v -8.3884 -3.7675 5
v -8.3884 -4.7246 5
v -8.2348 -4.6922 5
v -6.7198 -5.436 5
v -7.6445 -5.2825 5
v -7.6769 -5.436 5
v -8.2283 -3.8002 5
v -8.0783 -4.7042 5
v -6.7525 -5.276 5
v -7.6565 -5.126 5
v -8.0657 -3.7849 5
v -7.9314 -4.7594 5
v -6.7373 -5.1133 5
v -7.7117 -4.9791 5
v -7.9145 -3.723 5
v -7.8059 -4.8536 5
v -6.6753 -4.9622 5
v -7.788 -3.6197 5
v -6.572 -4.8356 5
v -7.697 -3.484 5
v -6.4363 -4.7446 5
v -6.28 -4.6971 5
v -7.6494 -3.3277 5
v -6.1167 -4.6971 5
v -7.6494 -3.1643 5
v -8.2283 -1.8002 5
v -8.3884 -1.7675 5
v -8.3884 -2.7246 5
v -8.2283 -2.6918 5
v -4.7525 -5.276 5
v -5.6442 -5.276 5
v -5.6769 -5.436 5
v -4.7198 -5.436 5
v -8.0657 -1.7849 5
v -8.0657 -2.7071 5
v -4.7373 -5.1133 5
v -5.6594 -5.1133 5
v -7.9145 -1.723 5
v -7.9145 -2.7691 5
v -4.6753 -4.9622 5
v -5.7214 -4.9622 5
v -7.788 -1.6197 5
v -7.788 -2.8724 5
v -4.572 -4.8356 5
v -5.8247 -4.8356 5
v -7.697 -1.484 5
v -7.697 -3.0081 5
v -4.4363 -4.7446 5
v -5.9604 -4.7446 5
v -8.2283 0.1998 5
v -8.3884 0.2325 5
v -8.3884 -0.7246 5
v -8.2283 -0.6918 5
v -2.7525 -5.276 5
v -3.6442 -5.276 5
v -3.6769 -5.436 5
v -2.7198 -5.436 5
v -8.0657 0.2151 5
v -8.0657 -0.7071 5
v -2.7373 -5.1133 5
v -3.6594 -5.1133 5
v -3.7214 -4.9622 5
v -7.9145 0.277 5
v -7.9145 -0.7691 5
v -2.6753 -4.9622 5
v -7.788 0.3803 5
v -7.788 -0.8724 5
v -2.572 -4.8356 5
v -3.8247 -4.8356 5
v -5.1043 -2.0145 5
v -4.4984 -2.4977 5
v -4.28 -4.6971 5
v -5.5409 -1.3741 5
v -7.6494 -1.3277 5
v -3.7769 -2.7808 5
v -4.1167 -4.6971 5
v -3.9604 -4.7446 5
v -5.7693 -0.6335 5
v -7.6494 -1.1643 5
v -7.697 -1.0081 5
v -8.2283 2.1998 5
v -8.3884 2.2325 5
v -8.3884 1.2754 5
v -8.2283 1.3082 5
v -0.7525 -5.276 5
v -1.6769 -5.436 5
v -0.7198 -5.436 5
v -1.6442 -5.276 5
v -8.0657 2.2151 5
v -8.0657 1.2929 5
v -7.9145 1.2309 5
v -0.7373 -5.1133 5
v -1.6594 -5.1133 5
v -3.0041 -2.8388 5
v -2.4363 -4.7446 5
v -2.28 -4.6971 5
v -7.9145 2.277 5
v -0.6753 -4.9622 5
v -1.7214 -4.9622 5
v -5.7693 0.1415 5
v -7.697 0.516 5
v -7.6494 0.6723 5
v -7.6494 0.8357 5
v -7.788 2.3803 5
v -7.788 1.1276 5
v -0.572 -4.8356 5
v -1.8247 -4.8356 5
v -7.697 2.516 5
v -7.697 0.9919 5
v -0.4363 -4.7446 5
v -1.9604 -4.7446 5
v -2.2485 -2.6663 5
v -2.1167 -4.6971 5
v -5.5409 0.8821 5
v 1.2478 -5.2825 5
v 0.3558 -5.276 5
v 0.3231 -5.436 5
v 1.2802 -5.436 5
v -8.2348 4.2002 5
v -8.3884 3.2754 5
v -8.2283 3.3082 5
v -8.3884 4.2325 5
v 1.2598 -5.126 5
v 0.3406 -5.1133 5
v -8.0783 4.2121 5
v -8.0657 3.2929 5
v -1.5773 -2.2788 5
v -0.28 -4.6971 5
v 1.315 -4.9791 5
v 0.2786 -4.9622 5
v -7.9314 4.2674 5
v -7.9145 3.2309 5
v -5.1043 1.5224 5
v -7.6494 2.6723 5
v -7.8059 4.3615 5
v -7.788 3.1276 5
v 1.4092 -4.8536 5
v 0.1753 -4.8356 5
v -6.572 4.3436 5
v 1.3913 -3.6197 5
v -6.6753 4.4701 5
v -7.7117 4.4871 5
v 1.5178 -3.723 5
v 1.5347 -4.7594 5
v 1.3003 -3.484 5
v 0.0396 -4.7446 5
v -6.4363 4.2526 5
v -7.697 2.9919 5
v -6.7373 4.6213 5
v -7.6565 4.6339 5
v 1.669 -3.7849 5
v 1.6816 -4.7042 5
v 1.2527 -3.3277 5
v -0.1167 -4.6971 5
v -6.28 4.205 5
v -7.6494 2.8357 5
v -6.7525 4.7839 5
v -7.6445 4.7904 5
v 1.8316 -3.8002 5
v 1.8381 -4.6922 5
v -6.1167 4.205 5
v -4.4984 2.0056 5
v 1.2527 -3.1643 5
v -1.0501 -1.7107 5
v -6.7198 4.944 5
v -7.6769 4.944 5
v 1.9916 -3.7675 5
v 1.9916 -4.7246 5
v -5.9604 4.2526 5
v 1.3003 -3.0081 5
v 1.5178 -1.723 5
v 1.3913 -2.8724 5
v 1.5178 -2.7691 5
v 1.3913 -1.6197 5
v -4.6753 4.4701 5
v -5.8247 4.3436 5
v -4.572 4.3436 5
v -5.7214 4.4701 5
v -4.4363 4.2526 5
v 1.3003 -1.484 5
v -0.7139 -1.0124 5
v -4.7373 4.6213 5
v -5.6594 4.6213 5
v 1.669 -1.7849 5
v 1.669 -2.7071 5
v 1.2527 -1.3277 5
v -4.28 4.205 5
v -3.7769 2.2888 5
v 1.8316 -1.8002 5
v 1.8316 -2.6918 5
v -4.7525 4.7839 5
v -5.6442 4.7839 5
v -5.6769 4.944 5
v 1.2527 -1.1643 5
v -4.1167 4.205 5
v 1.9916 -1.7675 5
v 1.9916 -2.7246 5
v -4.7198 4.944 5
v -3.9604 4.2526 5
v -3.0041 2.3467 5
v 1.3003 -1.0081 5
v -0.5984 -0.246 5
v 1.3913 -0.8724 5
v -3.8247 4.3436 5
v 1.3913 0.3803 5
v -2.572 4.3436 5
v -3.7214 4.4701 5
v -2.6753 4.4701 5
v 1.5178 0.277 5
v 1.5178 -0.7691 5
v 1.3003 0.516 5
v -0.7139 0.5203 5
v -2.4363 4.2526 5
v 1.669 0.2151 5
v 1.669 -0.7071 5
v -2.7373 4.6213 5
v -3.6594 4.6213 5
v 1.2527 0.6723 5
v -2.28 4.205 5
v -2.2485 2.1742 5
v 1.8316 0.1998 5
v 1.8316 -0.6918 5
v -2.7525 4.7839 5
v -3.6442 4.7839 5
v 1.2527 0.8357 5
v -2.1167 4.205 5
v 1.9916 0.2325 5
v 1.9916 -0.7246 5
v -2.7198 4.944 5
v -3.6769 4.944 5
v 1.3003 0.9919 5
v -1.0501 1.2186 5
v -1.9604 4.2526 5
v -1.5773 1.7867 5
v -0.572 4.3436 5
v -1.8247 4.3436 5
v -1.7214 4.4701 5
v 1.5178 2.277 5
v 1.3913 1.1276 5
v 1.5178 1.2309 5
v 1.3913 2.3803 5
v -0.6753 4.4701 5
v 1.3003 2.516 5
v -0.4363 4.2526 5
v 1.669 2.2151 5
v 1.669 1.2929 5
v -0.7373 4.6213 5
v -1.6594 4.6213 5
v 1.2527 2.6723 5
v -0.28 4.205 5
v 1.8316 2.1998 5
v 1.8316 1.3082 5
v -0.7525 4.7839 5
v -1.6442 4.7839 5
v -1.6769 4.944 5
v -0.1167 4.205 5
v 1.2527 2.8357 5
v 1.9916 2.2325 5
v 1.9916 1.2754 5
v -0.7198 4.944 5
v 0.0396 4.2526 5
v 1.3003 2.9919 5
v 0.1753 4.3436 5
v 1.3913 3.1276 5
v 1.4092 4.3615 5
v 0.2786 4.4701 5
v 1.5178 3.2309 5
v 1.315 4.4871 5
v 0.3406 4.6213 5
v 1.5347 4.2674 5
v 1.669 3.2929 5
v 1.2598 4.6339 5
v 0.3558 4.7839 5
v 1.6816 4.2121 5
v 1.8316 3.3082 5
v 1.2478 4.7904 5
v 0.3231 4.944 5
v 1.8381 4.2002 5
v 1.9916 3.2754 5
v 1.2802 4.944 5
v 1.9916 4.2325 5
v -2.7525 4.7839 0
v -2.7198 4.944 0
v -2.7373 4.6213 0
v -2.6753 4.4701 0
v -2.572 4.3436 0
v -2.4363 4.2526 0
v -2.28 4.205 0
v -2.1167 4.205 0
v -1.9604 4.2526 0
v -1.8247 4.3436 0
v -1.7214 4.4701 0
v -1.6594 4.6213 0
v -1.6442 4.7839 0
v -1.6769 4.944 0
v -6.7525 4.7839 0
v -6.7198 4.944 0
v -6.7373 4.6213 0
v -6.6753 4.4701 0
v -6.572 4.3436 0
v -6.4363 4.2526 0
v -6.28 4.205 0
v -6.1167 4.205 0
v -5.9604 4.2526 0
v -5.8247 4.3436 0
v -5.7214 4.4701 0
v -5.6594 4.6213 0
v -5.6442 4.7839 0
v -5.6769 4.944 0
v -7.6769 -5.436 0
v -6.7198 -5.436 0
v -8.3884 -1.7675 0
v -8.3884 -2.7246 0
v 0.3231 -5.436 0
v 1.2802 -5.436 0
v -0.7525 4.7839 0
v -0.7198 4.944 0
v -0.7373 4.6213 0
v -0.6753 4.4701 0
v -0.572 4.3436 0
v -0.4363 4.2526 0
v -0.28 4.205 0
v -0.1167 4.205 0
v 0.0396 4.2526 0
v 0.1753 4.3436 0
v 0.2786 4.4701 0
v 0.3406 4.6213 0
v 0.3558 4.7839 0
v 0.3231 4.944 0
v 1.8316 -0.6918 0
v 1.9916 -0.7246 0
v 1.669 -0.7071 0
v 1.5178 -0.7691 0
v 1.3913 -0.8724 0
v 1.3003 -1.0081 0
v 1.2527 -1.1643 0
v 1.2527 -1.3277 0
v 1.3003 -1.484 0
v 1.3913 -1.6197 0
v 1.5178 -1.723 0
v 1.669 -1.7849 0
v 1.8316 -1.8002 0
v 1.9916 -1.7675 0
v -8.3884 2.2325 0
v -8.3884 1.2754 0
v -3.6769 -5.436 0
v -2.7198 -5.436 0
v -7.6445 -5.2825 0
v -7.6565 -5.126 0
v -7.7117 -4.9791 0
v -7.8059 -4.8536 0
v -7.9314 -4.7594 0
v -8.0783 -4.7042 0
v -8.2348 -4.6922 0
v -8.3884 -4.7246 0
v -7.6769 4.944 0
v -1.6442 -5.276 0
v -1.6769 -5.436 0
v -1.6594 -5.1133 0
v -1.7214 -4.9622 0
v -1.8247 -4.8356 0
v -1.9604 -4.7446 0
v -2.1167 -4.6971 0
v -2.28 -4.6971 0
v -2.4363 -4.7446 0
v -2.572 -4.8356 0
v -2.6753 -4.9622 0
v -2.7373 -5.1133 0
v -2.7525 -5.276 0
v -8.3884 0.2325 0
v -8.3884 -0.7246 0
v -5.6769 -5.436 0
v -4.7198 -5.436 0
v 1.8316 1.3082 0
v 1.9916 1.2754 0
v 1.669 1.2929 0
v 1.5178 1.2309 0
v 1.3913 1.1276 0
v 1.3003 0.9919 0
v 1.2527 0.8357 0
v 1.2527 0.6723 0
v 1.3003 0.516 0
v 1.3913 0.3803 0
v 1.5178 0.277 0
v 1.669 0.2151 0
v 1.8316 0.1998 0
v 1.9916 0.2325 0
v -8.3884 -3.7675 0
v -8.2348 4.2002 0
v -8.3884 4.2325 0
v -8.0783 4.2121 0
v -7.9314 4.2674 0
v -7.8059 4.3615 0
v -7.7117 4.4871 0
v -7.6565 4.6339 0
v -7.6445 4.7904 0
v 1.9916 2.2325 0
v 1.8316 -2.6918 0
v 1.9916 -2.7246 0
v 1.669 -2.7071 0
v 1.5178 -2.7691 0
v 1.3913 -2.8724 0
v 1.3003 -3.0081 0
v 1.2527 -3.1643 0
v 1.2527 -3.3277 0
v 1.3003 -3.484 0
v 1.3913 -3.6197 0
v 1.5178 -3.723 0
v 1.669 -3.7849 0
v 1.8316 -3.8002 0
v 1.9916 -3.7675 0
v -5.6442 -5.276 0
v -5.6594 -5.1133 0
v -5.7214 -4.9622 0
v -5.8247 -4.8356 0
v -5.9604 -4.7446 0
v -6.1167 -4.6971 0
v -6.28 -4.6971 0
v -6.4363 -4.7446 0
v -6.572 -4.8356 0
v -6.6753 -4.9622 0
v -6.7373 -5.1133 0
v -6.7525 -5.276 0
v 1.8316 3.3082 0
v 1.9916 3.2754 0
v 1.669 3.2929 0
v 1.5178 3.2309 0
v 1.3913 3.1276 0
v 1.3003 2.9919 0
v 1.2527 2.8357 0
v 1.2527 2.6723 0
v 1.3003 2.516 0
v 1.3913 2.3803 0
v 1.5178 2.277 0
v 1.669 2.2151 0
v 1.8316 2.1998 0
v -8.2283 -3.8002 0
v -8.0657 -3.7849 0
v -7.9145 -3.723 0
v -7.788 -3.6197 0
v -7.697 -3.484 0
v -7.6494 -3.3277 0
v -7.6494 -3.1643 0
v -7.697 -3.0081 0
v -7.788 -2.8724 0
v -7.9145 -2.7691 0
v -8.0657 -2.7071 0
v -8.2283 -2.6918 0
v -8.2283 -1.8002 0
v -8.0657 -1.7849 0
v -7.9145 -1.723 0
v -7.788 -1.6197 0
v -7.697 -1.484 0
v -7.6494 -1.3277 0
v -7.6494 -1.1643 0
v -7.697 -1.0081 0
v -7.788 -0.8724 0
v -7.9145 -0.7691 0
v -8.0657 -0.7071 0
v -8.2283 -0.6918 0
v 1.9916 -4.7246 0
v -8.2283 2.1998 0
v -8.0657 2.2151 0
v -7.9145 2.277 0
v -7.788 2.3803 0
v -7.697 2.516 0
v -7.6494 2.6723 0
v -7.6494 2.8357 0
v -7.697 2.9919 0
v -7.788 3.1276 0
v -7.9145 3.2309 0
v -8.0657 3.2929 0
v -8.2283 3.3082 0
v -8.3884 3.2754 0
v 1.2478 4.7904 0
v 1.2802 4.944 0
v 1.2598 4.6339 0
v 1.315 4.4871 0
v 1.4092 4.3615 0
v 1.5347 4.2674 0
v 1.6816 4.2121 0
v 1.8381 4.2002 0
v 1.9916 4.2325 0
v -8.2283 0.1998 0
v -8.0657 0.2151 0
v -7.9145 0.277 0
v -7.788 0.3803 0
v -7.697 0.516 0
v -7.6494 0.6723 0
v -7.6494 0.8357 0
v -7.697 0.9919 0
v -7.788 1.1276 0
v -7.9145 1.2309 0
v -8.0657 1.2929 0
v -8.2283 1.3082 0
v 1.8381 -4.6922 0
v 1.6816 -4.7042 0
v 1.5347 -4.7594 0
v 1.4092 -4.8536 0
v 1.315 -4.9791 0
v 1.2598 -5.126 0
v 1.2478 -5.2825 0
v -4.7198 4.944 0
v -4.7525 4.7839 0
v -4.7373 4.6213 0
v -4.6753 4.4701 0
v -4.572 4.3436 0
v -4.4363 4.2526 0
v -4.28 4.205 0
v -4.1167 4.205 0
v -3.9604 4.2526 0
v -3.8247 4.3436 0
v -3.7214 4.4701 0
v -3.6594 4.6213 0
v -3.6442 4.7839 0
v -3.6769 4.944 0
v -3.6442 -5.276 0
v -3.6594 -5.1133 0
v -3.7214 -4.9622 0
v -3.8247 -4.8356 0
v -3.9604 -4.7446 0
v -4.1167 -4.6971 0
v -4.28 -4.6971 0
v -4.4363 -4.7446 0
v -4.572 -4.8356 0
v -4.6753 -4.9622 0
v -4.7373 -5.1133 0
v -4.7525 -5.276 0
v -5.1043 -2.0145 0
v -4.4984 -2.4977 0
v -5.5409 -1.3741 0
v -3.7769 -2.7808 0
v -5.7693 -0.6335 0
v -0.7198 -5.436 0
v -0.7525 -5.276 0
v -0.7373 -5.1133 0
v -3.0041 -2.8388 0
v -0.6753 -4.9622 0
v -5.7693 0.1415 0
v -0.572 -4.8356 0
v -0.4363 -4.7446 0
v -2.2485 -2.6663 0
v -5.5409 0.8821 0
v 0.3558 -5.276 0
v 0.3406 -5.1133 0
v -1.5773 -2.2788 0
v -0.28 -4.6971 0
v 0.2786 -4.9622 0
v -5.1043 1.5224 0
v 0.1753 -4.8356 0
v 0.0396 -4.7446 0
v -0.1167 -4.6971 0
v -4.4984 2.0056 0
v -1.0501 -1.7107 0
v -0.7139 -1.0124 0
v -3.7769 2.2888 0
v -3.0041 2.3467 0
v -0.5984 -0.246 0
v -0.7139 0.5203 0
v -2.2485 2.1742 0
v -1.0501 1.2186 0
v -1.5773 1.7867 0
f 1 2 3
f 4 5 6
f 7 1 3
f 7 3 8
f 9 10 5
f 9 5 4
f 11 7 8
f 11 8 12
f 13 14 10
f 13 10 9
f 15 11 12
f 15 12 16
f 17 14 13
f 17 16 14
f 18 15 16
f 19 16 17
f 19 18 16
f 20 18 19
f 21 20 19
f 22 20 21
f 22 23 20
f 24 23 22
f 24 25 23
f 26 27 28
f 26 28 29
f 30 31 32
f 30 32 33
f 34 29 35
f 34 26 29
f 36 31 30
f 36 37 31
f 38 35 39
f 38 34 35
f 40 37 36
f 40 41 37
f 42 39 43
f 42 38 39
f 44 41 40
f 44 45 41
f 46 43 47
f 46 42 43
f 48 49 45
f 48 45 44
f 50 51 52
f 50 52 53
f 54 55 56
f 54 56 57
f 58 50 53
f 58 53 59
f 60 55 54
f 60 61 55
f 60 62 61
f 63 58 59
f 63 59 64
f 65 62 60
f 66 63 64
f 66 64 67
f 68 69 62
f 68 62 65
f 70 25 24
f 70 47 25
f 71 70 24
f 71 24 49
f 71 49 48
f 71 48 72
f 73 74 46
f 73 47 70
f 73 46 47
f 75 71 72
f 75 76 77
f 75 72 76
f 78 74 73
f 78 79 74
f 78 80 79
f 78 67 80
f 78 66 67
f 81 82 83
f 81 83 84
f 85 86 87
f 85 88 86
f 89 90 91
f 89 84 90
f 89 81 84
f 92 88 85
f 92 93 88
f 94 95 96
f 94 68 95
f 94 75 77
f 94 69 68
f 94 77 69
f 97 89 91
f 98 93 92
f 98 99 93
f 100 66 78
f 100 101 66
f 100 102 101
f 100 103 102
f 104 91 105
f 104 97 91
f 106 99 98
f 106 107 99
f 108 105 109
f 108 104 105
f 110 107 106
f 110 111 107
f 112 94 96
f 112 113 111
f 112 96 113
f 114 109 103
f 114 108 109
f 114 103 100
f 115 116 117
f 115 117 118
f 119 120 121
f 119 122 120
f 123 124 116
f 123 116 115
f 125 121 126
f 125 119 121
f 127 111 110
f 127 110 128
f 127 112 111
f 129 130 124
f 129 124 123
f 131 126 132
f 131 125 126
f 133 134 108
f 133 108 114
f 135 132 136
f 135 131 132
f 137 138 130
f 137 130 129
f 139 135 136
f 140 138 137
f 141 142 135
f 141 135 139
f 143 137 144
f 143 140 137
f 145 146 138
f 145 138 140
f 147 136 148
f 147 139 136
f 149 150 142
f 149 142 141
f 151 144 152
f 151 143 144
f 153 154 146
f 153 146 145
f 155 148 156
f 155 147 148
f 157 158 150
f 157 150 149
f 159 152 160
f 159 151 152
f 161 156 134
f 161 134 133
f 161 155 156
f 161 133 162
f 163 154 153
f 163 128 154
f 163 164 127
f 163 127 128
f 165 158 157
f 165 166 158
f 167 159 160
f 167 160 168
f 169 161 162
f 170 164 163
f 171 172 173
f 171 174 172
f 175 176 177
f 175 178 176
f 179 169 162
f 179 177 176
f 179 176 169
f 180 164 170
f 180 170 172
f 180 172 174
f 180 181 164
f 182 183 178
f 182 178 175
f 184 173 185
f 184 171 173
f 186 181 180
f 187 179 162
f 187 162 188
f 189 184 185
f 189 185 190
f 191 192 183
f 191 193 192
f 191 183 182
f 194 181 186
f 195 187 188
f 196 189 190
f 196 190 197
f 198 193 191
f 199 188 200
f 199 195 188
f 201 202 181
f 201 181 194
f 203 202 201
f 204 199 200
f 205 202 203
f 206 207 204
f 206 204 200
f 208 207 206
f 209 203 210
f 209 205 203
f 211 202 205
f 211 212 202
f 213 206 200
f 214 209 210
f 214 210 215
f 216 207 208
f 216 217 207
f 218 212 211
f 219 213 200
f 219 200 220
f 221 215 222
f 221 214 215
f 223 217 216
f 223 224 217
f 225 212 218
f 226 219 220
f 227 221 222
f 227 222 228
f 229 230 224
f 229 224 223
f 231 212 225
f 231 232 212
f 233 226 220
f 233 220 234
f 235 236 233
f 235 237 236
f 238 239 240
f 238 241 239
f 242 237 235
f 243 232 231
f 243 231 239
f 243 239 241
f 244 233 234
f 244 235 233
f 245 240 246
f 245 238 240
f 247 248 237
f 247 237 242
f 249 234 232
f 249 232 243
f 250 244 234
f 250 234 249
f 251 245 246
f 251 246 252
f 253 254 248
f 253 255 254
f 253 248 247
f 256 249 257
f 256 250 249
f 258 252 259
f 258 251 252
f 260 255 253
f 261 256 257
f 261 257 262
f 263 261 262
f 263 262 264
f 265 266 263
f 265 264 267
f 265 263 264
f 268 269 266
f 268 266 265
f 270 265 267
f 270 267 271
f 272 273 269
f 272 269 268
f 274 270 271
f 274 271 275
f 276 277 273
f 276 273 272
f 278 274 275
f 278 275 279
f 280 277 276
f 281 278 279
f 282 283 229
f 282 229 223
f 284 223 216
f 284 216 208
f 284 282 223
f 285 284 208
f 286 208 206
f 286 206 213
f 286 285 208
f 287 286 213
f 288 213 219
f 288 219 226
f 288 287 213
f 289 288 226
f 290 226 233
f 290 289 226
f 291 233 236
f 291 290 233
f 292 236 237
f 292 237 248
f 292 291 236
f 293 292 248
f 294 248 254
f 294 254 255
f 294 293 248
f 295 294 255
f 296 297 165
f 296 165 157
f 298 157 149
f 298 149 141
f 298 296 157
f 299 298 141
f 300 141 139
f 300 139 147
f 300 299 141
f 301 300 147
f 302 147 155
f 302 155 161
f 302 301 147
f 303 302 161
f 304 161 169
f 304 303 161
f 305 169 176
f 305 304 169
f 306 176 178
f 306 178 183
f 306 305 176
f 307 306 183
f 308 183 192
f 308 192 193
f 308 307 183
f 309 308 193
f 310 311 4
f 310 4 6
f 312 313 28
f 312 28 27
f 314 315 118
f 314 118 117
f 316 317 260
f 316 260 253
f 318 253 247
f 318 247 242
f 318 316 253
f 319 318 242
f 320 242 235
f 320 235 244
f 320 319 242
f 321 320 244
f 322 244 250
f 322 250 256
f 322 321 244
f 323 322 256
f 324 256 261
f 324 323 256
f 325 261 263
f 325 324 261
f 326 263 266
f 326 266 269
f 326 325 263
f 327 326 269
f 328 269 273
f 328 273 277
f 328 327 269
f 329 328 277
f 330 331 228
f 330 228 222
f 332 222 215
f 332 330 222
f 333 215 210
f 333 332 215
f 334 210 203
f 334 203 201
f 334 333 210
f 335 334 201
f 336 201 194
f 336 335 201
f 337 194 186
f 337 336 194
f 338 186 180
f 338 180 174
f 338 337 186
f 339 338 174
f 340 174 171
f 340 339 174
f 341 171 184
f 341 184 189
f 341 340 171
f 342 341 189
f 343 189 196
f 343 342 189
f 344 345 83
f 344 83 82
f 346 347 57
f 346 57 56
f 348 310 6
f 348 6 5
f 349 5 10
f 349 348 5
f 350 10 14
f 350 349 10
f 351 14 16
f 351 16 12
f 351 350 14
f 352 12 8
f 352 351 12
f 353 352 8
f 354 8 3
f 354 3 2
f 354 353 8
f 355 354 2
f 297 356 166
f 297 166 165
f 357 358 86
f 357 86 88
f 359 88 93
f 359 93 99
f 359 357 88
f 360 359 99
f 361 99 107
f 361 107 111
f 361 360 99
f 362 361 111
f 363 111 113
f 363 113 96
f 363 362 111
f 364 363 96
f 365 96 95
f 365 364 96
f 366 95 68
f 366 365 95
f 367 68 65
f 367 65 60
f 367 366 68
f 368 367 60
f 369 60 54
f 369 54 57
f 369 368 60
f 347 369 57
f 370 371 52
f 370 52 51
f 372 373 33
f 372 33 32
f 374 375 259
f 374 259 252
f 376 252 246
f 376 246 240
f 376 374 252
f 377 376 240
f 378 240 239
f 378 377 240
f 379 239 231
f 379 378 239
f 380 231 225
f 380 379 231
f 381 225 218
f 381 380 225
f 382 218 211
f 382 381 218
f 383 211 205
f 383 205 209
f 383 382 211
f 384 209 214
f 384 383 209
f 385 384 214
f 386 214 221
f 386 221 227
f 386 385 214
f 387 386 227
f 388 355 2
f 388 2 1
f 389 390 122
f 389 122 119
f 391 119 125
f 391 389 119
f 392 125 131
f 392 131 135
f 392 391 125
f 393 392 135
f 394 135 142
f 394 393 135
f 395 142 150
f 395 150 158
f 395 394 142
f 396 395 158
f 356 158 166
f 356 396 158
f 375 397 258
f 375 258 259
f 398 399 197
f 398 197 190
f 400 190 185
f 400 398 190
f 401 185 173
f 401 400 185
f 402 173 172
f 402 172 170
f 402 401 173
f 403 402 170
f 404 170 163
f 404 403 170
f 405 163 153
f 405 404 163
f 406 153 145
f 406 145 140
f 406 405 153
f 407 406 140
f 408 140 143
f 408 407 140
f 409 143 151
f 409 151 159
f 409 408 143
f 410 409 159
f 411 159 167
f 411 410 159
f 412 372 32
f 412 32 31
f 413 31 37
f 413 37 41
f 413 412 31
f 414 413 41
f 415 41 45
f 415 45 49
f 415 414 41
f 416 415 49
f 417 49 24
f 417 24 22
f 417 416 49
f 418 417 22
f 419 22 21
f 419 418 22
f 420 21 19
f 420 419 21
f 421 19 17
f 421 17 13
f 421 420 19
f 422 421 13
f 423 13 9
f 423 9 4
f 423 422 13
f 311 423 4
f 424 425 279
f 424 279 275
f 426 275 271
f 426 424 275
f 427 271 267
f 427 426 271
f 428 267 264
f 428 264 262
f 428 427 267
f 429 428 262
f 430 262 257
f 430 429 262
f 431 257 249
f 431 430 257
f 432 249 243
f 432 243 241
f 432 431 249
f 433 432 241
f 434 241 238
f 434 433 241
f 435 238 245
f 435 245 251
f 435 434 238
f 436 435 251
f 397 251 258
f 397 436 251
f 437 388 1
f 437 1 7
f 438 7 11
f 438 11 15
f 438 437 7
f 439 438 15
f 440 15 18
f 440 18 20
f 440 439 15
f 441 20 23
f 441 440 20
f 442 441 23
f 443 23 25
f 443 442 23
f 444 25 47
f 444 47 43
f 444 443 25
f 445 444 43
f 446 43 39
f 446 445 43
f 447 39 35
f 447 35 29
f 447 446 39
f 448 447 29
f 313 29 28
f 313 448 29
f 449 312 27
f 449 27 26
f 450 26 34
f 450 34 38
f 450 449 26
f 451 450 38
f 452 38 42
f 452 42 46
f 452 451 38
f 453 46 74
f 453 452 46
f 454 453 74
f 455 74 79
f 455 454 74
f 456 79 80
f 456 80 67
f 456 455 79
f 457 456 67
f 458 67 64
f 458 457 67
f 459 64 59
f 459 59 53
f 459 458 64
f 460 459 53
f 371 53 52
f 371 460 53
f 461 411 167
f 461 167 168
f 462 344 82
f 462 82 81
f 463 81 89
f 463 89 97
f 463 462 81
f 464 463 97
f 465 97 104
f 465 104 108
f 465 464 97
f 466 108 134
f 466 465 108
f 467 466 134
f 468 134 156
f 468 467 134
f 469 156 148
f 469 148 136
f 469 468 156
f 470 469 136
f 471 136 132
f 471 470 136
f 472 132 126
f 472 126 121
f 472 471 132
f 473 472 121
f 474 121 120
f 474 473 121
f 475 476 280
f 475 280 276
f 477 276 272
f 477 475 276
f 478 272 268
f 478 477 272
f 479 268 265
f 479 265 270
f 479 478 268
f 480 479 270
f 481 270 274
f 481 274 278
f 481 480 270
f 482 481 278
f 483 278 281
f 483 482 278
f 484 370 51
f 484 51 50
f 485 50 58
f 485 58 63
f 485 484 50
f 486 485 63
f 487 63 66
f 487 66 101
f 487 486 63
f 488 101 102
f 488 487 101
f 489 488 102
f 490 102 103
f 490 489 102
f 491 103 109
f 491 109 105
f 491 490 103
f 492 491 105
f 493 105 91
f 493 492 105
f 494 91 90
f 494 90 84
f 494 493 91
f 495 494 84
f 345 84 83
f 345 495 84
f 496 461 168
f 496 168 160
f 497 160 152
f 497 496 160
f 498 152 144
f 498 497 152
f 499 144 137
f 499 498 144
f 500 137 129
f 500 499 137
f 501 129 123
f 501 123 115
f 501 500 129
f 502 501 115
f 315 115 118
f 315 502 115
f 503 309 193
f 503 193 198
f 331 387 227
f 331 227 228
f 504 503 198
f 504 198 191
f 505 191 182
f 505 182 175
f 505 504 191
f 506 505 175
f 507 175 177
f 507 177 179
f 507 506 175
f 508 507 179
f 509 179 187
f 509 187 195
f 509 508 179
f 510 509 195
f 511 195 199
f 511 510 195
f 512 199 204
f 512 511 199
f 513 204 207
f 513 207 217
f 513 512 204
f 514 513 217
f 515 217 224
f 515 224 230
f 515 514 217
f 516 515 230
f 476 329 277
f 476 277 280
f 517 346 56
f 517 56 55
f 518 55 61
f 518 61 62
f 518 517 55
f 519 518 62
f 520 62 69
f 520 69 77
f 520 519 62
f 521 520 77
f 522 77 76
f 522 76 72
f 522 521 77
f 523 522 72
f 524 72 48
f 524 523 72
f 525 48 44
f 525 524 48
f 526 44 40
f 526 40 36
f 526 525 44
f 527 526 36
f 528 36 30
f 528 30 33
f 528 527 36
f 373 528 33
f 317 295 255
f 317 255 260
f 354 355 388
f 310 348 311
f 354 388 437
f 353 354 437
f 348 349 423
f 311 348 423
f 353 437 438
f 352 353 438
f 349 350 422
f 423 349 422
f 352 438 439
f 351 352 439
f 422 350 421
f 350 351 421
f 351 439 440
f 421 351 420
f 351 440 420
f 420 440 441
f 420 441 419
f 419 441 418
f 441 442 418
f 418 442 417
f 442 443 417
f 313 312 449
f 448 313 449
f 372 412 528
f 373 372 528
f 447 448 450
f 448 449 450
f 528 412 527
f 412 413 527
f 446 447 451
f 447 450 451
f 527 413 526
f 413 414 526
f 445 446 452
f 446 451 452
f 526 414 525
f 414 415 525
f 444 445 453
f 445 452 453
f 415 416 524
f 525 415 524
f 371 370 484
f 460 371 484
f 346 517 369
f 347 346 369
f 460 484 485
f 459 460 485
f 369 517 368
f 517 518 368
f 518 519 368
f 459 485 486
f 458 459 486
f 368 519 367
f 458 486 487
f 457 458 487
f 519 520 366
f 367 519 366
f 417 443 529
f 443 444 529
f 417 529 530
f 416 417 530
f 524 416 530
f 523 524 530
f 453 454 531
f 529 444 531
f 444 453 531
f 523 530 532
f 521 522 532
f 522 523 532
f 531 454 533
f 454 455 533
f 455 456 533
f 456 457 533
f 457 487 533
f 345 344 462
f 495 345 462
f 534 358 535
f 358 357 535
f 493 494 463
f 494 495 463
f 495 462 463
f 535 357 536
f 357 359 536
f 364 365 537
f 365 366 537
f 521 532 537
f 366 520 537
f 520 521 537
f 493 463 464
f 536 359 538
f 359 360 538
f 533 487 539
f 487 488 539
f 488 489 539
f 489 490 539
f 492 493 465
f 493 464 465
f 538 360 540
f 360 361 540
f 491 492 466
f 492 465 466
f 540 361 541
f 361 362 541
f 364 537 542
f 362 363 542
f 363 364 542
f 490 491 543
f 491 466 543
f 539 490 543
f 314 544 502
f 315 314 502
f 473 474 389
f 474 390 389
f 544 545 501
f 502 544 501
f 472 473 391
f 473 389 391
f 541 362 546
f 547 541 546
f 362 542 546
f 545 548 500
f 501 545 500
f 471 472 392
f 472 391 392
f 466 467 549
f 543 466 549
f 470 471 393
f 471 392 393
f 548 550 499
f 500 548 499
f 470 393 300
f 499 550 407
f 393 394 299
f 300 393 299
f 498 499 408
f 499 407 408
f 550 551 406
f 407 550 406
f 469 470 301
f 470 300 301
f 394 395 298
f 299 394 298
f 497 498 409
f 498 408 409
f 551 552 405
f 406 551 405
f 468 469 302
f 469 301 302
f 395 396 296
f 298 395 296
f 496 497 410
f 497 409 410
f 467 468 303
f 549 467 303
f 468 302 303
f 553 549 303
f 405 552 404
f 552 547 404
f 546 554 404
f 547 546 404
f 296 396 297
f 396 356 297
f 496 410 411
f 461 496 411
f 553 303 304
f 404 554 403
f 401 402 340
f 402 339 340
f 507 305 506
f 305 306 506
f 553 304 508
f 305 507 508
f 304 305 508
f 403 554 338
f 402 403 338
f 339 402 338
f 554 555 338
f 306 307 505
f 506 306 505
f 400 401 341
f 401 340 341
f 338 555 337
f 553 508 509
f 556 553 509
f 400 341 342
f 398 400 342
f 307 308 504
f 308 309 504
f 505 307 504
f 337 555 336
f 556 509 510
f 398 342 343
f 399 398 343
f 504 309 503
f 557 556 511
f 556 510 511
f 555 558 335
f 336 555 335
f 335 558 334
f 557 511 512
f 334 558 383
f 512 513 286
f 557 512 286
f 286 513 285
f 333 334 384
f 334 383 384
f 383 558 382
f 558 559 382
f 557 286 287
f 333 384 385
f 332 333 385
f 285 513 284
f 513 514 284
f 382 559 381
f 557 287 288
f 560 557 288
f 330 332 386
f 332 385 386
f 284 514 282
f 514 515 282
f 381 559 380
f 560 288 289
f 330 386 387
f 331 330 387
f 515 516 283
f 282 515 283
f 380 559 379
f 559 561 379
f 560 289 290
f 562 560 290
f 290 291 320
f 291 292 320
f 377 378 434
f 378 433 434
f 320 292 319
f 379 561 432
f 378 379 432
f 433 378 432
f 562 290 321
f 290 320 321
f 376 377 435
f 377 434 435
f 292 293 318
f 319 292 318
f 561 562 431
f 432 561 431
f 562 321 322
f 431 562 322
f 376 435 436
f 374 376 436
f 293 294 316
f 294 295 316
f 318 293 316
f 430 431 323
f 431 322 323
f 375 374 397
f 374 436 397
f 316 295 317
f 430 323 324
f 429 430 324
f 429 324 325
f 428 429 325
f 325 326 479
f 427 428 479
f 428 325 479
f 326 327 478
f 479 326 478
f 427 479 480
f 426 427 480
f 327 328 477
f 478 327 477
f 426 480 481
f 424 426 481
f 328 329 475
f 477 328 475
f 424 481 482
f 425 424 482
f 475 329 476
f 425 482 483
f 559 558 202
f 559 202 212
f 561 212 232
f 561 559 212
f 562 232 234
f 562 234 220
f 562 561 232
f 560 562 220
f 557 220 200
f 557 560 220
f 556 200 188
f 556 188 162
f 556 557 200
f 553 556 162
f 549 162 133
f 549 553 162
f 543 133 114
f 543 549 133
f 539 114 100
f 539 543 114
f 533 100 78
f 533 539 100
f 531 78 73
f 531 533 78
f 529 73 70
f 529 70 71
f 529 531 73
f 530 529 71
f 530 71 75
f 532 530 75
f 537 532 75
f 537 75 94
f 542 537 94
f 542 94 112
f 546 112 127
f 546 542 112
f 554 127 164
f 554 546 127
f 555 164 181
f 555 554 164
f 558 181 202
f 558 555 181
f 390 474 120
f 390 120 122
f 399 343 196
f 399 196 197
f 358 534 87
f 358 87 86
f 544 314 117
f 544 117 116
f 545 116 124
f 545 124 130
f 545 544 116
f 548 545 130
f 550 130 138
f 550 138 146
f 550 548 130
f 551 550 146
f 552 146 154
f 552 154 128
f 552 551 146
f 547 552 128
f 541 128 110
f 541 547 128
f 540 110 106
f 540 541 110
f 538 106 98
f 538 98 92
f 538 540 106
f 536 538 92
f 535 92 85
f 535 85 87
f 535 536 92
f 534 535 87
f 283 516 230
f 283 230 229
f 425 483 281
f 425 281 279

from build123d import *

# Parameters (mm, degrees)
SKETCH2_R           = 4.1
SKETCH2_R_2         = 2.6
BOSS_EXTRUDE1_DEPTH = 5


with BuildPart() as part:
    # Sketch2 → Boss-Extrude1 (new body)
    # profile 1 of 2: a face of its own
    with BuildSketch(Plane.XY):
        with BuildLine():
            ThreePointArc((-8.388352144, 2.232508627), (-7.643352144, 2.753972912), (-8.388352144, 3.275437196))
            Line((-8.388352144, 3.275437196), (-8.388352144, 4.232508627))
            ThreePointArc((-8.388352144, 4.232508627), (-7.805907881, 4.361528648), (-7.67688786, 4.943972912))
            Line((-7.67688786, 4.943972912), (-6.719816429, 4.943972912))
            ThreePointArc((-6.719816429, 4.943972912), (-6.198352144, 4.198972912), (-5.67688786, 4.943972912))
            Line((-5.67688786, 4.943972912), (-4.719816429, 4.943972912))
            ThreePointArc((-4.719816429, 4.943972912), (-4.198352144, 4.198972912), (-3.67688786, 4.943972912))
            Line((-3.67688786, 4.943972912), (-2.719816429, 4.943972912))
            ThreePointArc((-2.719816429, 4.943972912), (-2.198352144, 4.198972912), (-1.67688786, 4.943972912))
            Line((-1.67688786, 4.943972912), (-0.719816429, 4.943972912))
            ThreePointArc((-0.719816429, 4.943972912), (-0.198352144, 4.198972912), (0.32311214, 4.943972912))
            Line((0.32311214, 4.943972912), (1.280183571, 4.943972912))
            ThreePointArc((1.280183571, 4.943972912), (1.409203592, 4.361528648), (1.991647856, 4.232508627))
            Line((1.991647856, 4.232508627), (1.991647856, 3.275437196))
            ThreePointArc((1.991647856, 3.275437196), (1.246647856, 2.753972912), (1.991647856, 2.232508627))
            Line((1.991647856, 2.232508627), (1.991647856, 1.275437196))
            ThreePointArc((1.991647856, 1.275437196), (1.246647856, 0.753972912), (1.991647856, 0.232508627))
            Line((1.991647856, 0.232508627), (1.991647856, -0.724562804))
            ThreePointArc((1.991647856, -0.724562804), (1.246647856, -1.246027088), (1.991647856, -1.767491373))
            Line((1.991647856, -1.767491373), (1.991647856, -2.724562804))
            ThreePointArc((1.991647856, -2.724562804), (1.246647856, -3.246027088), (1.991647856, -3.767491373))
            Line((1.991647856, -3.767491373), (1.991647856, -4.724562804))
            ThreePointArc((1.991647856, -4.724562804), (1.409203592, -4.853582824), (1.280183571, -5.436027088))
            Line((1.280183571, -5.436027088), (0.32311214, -5.436027088))
            ThreePointArc((0.32311214, -5.436027088), (-0.198352144, -4.691027088), (-0.719816429, -5.436027088))
            Line((-0.719816429, -5.436027088), (-1.67688786, -5.436027088))
            ThreePointArc((-1.67688786, -5.436027088), (-2.198352144, -4.691027088), (-2.719816429, -5.436027088))
            Line((-2.719816429, -5.436027088), (-3.67688786, -5.436027088))
            ThreePointArc((-3.67688786, -5.436027088), (-4.198352144, -4.691027088), (-4.719816429, -5.436027088))
            Line((-4.719816429, -5.436027088), (-5.67688786, -5.436027088))
            ThreePointArc((-5.67688786, -5.436027088), (-6.198352144, -4.691027088), (-6.719816429, -5.436027088))
            Line((-6.719816429, -5.436027088), (-7.67688786, -5.436027088))
            ThreePointArc((-7.67688786, -5.436027088), (-7.805907881, -4.853582824), (-8.388352144, -4.724562804))
            Line((-8.388352144, -4.724562804), (-8.388352144, -3.767491373))
            ThreePointArc((-8.388352144, -3.767491373), (-7.643352144, -3.246027088), (-8.388352144, -2.724562804))
            Line((-8.388352144, -2.724562804), (-8.388352144, -1.767491373))
            ThreePointArc((-8.388352144, -1.767491373), (-7.643352144, -1.246027088), (-8.388352144, -0.724562804))
            Line((-8.388352144, -0.724562804), (-8.388352144, 0.232508627))
            ThreePointArc((-8.388352144, 0.232508627), (-7.643352144, 0.753972912), (-8.388352144, 1.275437196))
            Line((-8.388352144, 1.275437196), (-8.388352144, 2.232508627))
        make_face()
        with Locations((-3.198352144, -0.246027088)):
            Circle(SKETCH2_R, mode=Mode.SUBTRACT)
    # profile 2 of 2: a face of its own
    with BuildSketch(Plane.XY):
        with Locations((-3.198352144, -0.246027088)):
            Circle(SKETCH2_R)
        with Locations((-3.198352144, -0.246027088)):
            Circle(SKETCH2_R_2, mode=Mode.SUBTRACT)
    extrude(amount=BOSS_EXTRUDE1_DEPTH)


solid = part.part
